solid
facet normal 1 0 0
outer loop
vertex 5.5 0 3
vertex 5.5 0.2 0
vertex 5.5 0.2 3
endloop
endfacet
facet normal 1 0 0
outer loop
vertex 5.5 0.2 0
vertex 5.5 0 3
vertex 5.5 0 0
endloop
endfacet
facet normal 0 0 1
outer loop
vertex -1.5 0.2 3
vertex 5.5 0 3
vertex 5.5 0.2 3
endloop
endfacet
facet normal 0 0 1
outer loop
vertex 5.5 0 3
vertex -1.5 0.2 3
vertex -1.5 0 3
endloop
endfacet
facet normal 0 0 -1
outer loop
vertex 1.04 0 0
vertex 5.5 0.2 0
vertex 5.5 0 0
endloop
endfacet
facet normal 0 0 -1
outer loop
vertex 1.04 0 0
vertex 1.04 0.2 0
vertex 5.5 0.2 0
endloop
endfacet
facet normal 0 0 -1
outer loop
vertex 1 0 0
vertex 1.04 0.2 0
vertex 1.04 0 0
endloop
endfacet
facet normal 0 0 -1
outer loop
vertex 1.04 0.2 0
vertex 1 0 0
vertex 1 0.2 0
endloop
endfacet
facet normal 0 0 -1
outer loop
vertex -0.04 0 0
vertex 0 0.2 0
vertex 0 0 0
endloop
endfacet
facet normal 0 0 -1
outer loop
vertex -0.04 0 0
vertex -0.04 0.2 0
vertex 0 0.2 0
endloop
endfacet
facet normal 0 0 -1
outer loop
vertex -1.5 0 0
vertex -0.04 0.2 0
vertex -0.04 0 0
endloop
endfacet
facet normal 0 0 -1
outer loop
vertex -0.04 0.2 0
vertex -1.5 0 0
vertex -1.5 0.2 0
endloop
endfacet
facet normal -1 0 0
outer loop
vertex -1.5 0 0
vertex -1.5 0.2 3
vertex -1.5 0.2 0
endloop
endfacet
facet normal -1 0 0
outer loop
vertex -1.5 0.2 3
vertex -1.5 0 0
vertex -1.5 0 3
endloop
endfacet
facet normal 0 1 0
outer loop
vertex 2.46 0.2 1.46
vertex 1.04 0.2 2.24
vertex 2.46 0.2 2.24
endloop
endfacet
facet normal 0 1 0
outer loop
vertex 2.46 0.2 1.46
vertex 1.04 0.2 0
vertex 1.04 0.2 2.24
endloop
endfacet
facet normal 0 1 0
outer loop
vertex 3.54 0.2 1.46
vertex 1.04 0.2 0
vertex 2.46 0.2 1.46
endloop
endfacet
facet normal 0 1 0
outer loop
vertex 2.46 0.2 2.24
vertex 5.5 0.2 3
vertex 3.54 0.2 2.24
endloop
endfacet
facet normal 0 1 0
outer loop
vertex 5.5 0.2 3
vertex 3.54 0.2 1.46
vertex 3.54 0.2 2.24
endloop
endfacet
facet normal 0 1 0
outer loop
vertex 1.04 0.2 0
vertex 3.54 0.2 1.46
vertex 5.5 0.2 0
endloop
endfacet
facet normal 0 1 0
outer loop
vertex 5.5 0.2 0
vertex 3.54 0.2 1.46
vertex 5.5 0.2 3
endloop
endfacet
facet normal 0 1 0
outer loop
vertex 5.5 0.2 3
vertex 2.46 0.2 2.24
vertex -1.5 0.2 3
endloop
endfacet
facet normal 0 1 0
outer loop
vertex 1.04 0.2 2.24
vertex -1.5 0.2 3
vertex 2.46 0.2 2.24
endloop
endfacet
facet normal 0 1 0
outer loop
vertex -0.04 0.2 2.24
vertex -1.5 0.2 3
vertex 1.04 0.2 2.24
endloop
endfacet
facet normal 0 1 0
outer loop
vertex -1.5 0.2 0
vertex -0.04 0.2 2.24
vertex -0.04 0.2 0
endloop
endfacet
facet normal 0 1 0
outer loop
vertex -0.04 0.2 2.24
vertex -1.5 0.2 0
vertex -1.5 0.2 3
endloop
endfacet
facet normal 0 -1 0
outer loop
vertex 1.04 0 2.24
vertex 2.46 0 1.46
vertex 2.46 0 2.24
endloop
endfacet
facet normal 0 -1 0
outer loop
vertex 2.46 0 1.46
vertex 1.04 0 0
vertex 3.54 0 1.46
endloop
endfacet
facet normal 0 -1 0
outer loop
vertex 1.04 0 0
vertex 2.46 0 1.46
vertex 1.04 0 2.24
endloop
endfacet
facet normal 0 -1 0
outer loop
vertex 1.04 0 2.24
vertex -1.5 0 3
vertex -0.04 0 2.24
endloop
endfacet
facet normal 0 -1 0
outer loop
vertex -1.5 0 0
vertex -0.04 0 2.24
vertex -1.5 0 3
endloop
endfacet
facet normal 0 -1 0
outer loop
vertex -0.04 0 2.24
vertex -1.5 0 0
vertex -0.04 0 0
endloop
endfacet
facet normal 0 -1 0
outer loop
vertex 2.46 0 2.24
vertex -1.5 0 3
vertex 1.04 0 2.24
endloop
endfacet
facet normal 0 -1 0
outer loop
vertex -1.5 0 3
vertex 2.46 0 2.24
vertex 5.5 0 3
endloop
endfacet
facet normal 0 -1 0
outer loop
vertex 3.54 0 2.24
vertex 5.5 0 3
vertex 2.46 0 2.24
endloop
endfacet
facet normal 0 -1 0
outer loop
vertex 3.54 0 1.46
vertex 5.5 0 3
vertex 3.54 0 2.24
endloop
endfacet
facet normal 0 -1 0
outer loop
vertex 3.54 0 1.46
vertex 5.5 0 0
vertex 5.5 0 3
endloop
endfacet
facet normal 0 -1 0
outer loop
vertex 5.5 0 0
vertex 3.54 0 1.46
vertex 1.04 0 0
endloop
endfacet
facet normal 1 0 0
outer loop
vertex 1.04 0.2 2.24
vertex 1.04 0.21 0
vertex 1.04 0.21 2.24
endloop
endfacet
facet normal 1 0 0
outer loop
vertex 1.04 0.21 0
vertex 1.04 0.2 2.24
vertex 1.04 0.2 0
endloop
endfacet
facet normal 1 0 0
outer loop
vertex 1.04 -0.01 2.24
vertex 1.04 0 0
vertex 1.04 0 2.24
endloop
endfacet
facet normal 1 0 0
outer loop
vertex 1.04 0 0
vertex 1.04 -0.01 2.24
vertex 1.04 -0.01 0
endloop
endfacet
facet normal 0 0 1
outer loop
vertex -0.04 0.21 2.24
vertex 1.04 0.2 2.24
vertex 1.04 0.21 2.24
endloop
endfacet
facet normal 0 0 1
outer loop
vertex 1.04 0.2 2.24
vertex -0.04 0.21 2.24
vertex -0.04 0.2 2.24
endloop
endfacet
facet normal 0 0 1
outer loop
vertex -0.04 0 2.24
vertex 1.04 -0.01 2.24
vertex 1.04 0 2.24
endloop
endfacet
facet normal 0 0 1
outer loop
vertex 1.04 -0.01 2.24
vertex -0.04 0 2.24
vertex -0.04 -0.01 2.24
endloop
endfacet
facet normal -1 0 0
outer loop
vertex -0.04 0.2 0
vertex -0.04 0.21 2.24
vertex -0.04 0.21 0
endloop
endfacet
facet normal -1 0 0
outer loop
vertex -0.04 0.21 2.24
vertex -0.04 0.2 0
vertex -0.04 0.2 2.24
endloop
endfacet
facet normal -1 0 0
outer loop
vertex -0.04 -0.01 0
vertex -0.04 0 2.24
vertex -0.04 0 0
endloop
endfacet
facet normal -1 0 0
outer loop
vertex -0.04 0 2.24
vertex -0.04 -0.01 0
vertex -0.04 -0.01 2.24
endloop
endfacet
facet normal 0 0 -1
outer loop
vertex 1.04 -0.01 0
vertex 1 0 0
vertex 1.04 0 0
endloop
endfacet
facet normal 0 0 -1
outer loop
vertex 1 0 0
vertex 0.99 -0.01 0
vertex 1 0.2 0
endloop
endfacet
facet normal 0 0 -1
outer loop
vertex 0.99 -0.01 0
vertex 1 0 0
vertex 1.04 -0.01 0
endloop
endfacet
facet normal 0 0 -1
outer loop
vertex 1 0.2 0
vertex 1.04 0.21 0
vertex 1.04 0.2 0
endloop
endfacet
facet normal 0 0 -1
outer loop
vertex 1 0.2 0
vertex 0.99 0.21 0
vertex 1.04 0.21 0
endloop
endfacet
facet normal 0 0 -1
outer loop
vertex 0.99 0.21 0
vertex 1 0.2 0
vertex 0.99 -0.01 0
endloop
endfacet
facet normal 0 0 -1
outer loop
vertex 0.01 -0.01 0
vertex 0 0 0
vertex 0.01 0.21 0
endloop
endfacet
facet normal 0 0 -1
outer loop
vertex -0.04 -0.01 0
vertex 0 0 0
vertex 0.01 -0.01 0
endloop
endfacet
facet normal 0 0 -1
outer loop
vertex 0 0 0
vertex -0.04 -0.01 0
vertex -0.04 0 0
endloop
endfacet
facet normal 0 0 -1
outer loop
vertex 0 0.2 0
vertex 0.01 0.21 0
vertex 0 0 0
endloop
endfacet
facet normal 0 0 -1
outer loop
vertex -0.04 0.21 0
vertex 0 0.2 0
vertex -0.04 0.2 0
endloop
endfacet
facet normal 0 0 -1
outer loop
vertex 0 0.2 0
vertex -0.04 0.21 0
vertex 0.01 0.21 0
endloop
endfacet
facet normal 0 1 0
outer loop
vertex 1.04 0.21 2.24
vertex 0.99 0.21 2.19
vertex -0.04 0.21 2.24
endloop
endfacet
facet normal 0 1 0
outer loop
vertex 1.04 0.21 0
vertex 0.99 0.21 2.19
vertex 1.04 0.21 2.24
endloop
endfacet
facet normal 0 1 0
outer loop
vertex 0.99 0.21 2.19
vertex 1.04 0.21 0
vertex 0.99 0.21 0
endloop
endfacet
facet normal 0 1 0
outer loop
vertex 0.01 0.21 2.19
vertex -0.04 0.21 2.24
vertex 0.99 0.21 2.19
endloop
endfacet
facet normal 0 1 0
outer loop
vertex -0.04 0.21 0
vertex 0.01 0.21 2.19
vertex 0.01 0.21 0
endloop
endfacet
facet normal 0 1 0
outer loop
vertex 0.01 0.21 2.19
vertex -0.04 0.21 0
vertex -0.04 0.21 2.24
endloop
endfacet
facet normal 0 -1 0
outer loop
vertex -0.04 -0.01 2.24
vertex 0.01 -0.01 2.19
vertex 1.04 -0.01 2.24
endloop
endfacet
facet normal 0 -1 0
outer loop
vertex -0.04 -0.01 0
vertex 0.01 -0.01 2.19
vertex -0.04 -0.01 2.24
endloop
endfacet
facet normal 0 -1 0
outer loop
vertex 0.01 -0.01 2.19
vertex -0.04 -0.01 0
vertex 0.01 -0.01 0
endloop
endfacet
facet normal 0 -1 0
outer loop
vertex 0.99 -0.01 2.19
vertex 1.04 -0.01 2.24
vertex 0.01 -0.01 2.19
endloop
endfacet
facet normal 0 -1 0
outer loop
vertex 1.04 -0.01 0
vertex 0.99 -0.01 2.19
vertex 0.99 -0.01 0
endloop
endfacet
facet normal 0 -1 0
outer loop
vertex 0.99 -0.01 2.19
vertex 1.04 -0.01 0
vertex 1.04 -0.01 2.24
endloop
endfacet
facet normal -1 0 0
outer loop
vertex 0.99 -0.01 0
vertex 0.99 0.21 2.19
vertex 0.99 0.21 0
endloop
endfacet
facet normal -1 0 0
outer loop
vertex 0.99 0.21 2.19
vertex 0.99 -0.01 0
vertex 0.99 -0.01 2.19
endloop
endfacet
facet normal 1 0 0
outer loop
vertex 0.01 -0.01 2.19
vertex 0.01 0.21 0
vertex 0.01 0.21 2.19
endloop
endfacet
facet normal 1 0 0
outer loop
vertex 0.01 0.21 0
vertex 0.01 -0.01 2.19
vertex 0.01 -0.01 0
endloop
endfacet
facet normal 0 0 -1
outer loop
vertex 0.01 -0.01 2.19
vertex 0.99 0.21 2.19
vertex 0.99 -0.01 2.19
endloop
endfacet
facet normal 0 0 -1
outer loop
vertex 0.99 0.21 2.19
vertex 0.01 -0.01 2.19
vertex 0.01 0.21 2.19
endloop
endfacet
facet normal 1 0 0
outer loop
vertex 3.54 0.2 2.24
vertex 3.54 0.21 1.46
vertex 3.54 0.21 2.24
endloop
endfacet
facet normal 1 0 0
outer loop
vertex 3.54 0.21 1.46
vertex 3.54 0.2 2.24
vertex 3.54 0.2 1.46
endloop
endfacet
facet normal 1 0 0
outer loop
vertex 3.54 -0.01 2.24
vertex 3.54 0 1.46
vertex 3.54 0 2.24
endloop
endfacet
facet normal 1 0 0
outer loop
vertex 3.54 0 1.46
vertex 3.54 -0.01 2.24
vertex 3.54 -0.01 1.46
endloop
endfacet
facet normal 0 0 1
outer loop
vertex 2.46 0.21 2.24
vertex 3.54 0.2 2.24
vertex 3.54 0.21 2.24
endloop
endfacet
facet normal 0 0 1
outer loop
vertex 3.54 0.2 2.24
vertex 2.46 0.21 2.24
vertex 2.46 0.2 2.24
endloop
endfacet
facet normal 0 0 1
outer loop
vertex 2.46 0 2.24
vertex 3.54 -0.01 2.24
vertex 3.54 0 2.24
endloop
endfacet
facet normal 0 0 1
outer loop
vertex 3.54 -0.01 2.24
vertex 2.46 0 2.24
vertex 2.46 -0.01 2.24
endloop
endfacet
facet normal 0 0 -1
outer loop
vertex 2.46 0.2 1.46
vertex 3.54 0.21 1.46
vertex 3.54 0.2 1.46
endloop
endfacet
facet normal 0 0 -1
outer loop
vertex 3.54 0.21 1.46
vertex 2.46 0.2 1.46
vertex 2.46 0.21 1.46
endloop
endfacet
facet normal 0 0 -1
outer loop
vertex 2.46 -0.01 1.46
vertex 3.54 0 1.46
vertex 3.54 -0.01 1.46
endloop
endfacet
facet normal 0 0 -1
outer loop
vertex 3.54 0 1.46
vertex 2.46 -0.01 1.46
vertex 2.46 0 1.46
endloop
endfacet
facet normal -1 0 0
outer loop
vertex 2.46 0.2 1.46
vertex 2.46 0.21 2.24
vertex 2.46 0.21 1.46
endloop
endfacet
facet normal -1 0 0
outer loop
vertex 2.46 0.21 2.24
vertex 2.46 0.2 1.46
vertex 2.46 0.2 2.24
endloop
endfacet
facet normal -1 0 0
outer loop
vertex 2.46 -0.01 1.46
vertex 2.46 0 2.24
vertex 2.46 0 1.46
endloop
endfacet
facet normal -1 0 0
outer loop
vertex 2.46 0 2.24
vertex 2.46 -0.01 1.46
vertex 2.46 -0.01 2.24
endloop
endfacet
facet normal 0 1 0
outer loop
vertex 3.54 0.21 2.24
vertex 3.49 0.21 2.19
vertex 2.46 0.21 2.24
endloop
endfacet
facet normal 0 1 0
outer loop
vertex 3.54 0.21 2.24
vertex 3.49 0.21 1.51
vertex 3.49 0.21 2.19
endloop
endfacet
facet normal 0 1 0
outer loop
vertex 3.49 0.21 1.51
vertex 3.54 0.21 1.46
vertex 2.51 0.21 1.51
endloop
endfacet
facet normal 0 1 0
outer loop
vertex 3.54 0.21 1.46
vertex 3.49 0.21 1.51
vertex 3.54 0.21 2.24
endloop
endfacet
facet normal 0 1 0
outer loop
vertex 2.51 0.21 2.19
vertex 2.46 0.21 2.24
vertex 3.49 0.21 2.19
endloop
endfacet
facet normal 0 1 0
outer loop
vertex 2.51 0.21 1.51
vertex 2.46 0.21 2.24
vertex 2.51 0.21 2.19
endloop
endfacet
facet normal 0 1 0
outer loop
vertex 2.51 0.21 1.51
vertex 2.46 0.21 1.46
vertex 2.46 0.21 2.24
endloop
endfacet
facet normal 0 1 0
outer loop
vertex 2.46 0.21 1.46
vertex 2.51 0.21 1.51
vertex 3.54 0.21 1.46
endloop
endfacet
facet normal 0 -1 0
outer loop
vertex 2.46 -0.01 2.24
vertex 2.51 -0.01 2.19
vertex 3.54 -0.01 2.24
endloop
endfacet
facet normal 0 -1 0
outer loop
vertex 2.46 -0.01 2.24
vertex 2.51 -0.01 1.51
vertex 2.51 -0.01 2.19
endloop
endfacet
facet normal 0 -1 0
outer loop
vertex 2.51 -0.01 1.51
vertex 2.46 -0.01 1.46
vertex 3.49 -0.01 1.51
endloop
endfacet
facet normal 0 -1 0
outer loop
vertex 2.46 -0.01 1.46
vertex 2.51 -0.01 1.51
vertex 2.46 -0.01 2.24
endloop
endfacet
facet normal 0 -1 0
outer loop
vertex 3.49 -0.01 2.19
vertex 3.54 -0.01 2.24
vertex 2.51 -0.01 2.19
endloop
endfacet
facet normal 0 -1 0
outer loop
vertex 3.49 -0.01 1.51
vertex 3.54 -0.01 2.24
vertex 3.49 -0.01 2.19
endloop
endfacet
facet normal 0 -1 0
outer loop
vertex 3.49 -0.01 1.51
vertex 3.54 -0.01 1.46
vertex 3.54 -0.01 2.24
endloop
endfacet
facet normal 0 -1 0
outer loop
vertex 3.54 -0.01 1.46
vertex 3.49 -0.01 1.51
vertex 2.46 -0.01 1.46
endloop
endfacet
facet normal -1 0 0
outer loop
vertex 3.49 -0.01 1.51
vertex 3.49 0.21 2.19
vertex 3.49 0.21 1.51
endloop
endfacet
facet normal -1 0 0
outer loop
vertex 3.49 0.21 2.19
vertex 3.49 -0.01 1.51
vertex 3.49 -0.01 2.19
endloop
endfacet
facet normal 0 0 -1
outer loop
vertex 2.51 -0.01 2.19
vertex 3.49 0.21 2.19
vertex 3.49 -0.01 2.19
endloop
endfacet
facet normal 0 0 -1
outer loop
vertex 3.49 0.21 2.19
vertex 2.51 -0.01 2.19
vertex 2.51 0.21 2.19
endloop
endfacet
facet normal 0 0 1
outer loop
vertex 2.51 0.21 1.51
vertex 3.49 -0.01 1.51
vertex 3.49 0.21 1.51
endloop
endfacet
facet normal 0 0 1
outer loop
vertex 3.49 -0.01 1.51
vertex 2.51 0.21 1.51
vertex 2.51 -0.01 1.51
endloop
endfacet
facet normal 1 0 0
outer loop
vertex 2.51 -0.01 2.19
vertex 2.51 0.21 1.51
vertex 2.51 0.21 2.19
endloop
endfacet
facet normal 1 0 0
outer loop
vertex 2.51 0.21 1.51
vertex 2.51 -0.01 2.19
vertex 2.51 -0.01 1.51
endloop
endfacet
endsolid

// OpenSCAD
// file: simple_planimetry.scad
/*
Make simple extrusions from dxf

dxf layers: default values are true. Set false if you don't want to draw it.
Example: you can set ceiling=false if you want to se in the house.

INPUTS:
file
floor_thickness=0.3
internal_height=3
ceiling_thickness=0.3
doors_external_height=2.3
doors_internal_height=2
windows_height=1.5
windows_height_from_floor=1
windows_high_height=0.5
windows_high_height_from_floor=2.3
railings_height=1
walls=true
floor=true
ceiling=true
railings=true
doors_external=true
doors_internal=true
windows=true
windows_high=true
*/
module build_dxf(file, floor_thickness=0.3, internal_height=3, ceiling_thickness=0.3, doors_external_height=2.3, doors_internal_height=2, windows_height=1.5, windows_height_from_floor=1, windows_high_height=0.5, windows_high_height_from_floor=2.3, railings_height=1, walls=true, floor=true, ceiling=true, railings=true, doors_external=true, doors_internal=true, windows=true, windows_high=true){
  render(convexity=10){
    difference(){
      union(){
        if(floor) _extrude_layer(file, "floor", floor_thickness, -floor_thickness);
        if(walls) _extrude_layer(file, "walls", internal_height);
        if(ceiling) _extrude_layer(file, "ceiling", ceiling_thickness, internal_height);
        if(railings) _extrude_layer(file, "railings", railings_height);
        _extrude_layer(file, "doors_external", internal_height);
        _extrude_layer(file, "doors_internal", internal_height);
        _extrude_layer(file, "windows", internal_height);
        _extrude_layer(file, "windows_heigh", internal_height);
      }
      union(){
        if(doors_external) _extrude_layer(file, "doors_external", doors_external_height);
        if(doors_internal) _extrude_layer(file, "doors_internal", doors_internal_height);
        if(windows) _extrude_layer(file, "windows", windows_height, windows_height_from_floor);
        if(windows_high) _extrude_layer(file, "windows_high", windows_high_height, windows_high_height_from_floor);
      }
    }
  }
}

/*
Extrude custom layer.

INPUTS:
file: dxf file
layer: layer name from dxf file
height: extrusion
lift=0: move the object up
*/
module _extrude_layer(file, layer, height, lift=0){
  translate([0,0,lift])
  linear_extrude(height)
  import (file, layer);
}

/*
Build wall frame for doors and windows

INPUTS:
hole_width: the width of the wall hole
hole_depth: the depth of the wall hole
hole_height: the height of the wall hole
frame_thickness: the thickness of the frame
frame_overhang: the overhang of the frame
erase_bottom: true to erase the frame at the bottom
*/
module wall_frame(hole_width, hole_depth, hole_height, frame_thickness, frame_overhang, erase_bottom=false){
  render(convexity=10){
    difference(){
      // Frame Bounding
      if (frame_overhang == 0){
        cube([hole_width, hole_depth, hole_height], center=false);
      }
      else {
        translate([-frame_overhang, -frame_thickness, -frame_overhang])
        cube([hole_width+frame_overhang*2, hole_depth+frame_thickness*2, hole_height+frame_overhang*2], center=false);
      }
      
      // Frame hole
      translate([frame_thickness, -frame_thickness, frame_thickness])
      cube([hole_width-frame_thickness*2, hole_depth+frame_thickness*2, hole_height-frame_thickness*2], center=false);
      
      // The wall
      difference(){
        translate([-frame_overhang, 0, -frame_overhang])
        cube([hole_width+frame_overhang*2, hole_depth, hole_height+frame_overhang*2], center=false);
        cube([hole_width, hole_depth, hole_height], center=false);
      }
      
      // Erase the frame at the bottom?
      if (erase_bottom){
        translate([-frame_overhang, -frame_thickness, -frame_overhang])
        cube([hole_width+frame_overhang*2, hole_depth+frame_thickness*2, frame_overhang], center=false);
        translate([frame_thickness, -frame_thickness, 0])
        cube([hole_width-frame_thickness*2, hole_depth+frame_thickness*2, frame_thickness], center=false);
      }
    }
  }
}
// main file
use <simple_planimetry.scad>;

// Wall with the holes
wall_width=7;
wall_height=3;
wall_depth=0.2;

// Hole for door
wall_hole1_width=1.0;
wall_hole1_height=2.2;

// Hole for window
wall_hole2_width=1.0;
wall_hole2_height=0.7;
wall_hole2_lift=1.5;

// Draw wall with holes
render(convexity=10){
  difference(){
    translate([-1.5, 0, 0]) cube([wall_width, wall_depth, 3]);
    cube([wall_hole1_width, wall_depth, wall_hole1_height]);
    translate([2.5, 0, wall_hole2_lift]) cube([wall_hole2_width, wall_depth, wall_hole2_height]);
  }
}

// Draw the door's frame
color("brown")
wall_frame(hole_width=wall_hole1_width, hole_depth=wall_depth, hole_height=wall_hole1_height, frame_thickness=0.01, frame_overhang=0.04, erase_bottom=true);

// Draw the window's frame
color("brown")
translate([2.5, 0, wall_hole2_lift])
wall_frame(hole_width=wall_hole2_width, hole_depth=wall_depth, hole_height=wall_hole2_height, frame_thickness=0.01, frame_overhang=0.04, erase_bottom=false);
